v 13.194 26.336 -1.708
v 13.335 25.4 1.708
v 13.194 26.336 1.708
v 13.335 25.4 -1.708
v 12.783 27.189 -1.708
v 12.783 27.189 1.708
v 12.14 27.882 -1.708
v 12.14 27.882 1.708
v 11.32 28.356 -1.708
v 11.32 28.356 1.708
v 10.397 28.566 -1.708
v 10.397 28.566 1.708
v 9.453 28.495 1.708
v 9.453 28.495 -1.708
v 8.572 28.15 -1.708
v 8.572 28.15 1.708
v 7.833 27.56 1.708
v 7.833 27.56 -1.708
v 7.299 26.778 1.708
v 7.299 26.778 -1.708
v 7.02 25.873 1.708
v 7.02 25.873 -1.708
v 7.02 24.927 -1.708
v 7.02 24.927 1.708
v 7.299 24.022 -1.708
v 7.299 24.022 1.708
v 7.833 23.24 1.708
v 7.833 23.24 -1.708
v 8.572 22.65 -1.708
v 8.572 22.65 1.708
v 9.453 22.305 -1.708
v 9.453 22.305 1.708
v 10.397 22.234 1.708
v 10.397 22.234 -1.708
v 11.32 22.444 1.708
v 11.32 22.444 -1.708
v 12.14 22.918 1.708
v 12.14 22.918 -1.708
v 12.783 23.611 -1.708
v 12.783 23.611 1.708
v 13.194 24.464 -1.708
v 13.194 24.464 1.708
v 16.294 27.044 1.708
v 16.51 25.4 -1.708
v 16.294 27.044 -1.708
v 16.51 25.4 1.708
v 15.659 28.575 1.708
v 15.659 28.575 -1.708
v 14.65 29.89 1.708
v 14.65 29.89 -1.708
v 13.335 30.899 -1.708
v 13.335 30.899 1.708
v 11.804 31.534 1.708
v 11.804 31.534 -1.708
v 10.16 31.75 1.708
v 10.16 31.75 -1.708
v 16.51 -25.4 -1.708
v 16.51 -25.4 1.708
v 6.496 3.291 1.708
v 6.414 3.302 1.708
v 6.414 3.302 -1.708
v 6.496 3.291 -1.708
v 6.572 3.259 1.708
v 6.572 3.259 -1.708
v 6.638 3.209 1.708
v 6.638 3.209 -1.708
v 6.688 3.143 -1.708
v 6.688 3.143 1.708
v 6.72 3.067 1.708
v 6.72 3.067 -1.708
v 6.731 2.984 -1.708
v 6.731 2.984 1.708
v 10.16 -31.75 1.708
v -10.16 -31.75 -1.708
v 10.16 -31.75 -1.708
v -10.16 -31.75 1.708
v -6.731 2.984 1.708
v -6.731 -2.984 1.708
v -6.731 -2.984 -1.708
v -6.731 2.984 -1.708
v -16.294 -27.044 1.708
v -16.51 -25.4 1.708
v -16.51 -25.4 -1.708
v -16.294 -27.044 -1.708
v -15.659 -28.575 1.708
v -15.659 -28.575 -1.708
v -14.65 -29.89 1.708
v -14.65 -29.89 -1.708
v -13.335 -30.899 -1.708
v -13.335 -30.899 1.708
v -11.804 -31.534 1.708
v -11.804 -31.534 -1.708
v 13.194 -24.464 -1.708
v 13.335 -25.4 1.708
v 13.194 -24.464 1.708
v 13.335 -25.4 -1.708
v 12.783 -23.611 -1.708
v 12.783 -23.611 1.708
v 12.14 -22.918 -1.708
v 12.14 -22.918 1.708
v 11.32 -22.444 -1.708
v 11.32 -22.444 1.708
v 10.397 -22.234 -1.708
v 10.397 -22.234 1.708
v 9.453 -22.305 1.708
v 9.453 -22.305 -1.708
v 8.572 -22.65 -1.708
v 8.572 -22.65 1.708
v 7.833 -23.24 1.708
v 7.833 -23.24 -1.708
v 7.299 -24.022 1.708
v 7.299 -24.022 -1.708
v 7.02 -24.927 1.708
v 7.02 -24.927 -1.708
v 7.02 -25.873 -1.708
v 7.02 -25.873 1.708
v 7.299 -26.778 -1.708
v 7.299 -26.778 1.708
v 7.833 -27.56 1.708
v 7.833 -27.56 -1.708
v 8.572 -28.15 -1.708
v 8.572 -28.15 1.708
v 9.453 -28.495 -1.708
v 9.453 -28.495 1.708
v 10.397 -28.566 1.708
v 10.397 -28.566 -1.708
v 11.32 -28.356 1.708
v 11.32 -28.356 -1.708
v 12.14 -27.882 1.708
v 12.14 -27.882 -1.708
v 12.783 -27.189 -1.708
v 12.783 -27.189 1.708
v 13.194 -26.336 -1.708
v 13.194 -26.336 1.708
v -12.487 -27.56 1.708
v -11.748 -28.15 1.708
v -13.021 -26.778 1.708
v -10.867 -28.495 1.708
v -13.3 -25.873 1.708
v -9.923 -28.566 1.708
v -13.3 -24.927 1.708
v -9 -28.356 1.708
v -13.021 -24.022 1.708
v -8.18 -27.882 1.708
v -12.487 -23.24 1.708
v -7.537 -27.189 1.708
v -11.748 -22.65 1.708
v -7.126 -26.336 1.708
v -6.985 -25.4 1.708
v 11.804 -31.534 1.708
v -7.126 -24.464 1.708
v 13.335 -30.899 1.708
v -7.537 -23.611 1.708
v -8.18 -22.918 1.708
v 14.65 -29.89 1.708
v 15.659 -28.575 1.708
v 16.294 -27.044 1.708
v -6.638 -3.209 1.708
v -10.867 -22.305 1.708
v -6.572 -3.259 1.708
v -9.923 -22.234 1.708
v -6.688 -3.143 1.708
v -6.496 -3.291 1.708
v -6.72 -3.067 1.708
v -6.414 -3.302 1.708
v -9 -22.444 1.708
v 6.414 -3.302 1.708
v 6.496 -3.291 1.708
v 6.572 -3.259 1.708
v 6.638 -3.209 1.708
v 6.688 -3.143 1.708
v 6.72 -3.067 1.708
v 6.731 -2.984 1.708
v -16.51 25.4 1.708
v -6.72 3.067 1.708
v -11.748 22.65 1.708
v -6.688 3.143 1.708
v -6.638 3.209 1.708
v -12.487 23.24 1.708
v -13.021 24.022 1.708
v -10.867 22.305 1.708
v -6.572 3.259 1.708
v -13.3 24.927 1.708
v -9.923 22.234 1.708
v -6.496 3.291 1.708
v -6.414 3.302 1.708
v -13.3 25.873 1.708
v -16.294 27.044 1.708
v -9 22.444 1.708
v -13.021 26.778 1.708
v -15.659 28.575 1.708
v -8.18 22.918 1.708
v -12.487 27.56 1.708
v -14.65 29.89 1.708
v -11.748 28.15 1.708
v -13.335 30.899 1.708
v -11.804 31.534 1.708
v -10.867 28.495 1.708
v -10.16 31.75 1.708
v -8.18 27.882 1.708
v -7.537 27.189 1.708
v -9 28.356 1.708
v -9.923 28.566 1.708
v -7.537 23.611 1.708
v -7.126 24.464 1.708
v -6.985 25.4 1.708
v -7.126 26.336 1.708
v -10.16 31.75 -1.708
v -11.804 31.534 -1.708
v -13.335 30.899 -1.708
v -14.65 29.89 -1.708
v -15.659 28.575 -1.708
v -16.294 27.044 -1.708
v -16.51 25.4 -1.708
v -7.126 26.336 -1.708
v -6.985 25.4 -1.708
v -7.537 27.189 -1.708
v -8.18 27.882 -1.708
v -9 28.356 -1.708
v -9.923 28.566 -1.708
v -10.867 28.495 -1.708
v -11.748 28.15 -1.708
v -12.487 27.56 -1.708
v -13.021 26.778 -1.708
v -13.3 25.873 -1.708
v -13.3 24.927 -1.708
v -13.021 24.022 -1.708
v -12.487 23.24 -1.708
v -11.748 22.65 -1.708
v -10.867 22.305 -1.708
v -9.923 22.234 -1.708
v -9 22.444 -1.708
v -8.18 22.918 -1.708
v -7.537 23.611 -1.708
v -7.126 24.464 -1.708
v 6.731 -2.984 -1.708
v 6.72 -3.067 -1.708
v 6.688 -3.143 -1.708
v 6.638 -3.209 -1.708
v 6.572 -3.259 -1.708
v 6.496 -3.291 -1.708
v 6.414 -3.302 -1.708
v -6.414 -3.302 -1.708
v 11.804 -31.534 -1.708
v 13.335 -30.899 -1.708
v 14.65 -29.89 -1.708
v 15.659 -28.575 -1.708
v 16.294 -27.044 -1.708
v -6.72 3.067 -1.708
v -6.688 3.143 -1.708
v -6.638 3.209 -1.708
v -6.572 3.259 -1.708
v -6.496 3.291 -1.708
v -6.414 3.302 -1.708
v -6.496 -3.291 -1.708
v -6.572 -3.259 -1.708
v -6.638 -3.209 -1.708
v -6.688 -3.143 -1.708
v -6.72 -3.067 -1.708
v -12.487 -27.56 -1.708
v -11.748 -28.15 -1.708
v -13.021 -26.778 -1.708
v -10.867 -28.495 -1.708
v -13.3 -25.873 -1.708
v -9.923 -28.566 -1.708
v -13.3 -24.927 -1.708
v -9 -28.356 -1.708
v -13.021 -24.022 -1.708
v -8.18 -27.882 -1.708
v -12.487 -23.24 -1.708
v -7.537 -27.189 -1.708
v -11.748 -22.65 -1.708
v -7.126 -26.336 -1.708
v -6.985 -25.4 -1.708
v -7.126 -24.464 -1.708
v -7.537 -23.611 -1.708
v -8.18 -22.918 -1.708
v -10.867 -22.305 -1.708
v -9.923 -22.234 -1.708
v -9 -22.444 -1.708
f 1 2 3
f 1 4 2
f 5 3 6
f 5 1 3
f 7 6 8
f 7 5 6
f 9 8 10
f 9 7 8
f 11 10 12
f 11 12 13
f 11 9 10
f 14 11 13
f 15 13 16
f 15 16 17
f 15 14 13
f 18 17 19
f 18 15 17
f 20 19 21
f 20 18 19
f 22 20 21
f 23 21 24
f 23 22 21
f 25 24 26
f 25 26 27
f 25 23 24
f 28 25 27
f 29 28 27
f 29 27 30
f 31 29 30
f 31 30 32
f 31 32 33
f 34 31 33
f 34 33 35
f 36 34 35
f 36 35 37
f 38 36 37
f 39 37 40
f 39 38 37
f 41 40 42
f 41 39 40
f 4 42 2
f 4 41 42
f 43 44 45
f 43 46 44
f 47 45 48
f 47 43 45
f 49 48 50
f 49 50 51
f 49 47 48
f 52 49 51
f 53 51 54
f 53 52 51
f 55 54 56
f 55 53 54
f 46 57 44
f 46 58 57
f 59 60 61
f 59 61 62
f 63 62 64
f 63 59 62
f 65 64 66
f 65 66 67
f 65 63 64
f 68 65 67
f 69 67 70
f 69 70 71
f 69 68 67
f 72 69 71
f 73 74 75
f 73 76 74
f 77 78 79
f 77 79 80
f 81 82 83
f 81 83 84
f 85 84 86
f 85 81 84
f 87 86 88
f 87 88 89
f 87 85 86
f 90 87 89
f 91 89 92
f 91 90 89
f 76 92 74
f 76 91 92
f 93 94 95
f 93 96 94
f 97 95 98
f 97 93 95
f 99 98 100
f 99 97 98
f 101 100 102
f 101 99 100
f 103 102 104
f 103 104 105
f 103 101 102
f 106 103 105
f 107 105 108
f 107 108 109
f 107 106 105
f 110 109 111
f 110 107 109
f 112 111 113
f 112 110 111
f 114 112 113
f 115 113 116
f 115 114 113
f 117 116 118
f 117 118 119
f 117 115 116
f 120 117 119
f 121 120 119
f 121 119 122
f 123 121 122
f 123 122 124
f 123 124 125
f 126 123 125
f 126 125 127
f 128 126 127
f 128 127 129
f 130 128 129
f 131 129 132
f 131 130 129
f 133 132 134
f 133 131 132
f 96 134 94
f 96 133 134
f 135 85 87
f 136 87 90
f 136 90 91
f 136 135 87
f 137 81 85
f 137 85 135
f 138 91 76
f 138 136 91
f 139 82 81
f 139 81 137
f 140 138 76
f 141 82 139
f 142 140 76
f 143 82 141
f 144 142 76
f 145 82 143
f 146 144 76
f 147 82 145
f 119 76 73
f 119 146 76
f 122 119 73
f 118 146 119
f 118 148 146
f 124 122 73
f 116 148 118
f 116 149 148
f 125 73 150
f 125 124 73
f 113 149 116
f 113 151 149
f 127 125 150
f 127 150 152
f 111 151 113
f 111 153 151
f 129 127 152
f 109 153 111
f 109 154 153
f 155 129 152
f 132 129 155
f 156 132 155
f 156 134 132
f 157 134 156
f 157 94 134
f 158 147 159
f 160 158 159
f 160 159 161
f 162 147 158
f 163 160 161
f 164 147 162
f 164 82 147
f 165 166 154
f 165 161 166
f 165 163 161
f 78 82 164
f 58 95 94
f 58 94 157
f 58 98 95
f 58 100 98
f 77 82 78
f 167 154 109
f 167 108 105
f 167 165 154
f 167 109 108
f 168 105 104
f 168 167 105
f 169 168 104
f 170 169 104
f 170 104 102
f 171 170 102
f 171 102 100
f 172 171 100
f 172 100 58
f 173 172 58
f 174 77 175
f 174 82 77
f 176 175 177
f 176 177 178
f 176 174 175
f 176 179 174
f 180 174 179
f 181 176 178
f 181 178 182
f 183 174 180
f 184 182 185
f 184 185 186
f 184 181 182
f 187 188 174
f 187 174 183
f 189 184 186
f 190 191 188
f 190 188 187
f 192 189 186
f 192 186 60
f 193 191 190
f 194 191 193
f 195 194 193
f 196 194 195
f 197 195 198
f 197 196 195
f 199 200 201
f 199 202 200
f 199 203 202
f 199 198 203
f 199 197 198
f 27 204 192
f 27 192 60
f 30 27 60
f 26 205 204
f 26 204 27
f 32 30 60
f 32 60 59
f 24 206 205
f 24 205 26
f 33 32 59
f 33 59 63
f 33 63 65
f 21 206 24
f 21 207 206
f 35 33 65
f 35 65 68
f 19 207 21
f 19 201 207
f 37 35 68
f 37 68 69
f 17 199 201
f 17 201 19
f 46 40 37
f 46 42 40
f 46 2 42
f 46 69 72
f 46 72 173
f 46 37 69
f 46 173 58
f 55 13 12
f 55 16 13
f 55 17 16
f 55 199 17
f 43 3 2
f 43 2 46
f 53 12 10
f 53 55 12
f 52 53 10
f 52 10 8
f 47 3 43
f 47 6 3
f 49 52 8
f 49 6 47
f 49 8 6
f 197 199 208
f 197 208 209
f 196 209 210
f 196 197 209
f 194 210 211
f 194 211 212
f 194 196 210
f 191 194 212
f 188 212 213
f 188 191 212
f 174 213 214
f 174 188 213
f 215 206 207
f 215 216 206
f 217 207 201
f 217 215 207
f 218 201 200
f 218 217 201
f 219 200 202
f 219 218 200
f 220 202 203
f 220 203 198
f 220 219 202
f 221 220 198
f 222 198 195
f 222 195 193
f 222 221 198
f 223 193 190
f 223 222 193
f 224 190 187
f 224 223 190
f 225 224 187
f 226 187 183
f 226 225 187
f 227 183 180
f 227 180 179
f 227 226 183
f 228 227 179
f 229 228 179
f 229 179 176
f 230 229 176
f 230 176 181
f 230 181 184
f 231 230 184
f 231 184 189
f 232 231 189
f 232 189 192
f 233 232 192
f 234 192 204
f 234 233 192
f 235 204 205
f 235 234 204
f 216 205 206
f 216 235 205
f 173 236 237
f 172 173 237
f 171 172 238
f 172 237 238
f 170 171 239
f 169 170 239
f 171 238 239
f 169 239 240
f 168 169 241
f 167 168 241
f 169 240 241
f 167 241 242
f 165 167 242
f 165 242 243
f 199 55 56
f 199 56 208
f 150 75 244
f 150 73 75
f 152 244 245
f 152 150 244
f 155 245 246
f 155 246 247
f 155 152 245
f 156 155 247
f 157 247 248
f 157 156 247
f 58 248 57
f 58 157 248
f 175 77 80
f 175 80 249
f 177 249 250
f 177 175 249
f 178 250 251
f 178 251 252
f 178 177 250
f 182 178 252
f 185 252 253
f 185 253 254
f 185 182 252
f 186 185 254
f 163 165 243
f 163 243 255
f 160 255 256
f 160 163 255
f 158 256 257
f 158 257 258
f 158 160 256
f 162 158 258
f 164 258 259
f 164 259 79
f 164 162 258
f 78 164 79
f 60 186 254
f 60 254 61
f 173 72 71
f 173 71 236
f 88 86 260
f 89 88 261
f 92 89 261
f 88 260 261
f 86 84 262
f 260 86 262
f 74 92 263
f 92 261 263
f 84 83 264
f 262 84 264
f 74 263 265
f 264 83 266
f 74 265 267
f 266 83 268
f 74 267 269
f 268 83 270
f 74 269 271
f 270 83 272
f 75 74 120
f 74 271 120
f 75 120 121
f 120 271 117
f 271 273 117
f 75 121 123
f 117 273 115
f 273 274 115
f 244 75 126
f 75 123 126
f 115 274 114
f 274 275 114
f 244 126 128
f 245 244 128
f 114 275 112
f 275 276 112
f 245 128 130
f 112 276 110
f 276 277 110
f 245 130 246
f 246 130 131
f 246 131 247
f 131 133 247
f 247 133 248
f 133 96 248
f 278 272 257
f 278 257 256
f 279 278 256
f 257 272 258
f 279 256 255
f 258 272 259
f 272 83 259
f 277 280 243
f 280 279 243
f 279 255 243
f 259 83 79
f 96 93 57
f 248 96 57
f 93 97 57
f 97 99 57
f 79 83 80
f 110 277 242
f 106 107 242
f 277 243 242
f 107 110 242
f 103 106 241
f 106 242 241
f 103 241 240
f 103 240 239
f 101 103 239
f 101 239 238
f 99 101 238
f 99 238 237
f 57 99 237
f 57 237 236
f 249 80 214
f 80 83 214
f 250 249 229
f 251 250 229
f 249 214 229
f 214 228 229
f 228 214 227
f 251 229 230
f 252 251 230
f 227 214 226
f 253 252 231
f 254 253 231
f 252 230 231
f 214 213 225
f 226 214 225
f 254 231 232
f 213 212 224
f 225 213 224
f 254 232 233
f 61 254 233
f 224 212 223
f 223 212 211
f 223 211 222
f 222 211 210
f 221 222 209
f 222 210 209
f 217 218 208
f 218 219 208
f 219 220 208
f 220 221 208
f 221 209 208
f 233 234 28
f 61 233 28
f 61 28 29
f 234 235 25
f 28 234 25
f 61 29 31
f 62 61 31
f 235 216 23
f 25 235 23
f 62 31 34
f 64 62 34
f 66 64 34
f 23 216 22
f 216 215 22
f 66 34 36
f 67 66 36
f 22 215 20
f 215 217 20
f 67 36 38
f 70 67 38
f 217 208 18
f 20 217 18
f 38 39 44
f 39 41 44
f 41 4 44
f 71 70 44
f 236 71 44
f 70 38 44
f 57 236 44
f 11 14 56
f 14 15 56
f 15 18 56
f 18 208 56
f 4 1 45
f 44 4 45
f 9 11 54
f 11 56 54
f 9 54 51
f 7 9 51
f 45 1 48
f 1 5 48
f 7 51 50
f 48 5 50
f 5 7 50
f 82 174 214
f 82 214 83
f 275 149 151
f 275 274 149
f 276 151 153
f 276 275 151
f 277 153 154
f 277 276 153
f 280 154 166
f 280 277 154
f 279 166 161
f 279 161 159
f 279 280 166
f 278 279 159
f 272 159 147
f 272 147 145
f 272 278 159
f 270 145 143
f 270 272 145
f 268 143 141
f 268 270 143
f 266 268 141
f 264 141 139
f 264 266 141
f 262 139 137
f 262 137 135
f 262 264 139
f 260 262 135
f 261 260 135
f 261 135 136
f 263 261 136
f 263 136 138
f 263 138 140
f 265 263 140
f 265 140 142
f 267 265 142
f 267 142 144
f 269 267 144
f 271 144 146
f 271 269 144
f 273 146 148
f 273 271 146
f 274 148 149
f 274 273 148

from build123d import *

# Parameters (mm, degrees)
F0_R     = 3.175
F1_DEPTH = 1.70815


with BuildPart() as f1:
    # F0 (on Top) → F1 (new body, symmetric)
    with BuildSketch(Plane.XY):
        with BuildLine():
            ThreePointArc((16.51, 25.4), (14.650128, 29.890128), (10.16, 31.75))
            Line((10.16, 31.75), (-10.16, 31.75))
            ThreePointArc((-10.16, 31.75), (-14.650128, 29.890128), (-16.51, 25.4))
            Line((-16.51, 25.4), (-16.51, -25.4))
            ThreePointArc((-16.51, -25.4), (-14.650128, -29.890128), (-10.16, -31.75))
            Line((-10.16, -31.75), (10.16, -31.75))
            ThreePointArc((10.16, -31.75), (14.650128, -29.890128), (16.51, -25.4))
            Line((16.51, -25.4), (16.51, 25.4))
        make_face()
        with Locations((-10.16, -25.4)):
            Circle(F0_R, mode=Mode.SUBTRACT)
        with Locations((10.16, -25.4)):
            Circle(F0_R, mode=Mode.SUBTRACT)
        with Locations((-10.16, 25.4)):
            Circle(F0_R, mode=Mode.SUBTRACT)
        with BuildLine():
            Line((-6.4135, 3.302), (6.4135, 3.302))
            ThreePointArc((6.4135, 3.302), (6.638006, 3.209006), (6.731, 2.9845))
            Line((6.731, 2.9845), (6.731, -2.9845))
            ThreePointArc((6.731, -2.9845), (6.638006, -3.209006), (6.4135, -3.302))
            Line((6.4135, -3.302), (-6.4135, -3.302))
            ThreePointArc((-6.4135, -3.302), (-6.638006, -3.209006), (-6.731, -2.9845))
            Line((-6.731, -2.9845), (-6.731, 2.9845))
            ThreePointArc((-6.731, 2.9845), (-6.638006, 3.209006), (-6.4135, 3.302))
        make_face(mode=Mode.SUBTRACT)
        with Locations((10.16, 25.4)):
            Circle(F0_R, mode=Mode.SUBTRACT)
    extrude(amount=F1_DEPTH, both=True)


solid = f1.part
